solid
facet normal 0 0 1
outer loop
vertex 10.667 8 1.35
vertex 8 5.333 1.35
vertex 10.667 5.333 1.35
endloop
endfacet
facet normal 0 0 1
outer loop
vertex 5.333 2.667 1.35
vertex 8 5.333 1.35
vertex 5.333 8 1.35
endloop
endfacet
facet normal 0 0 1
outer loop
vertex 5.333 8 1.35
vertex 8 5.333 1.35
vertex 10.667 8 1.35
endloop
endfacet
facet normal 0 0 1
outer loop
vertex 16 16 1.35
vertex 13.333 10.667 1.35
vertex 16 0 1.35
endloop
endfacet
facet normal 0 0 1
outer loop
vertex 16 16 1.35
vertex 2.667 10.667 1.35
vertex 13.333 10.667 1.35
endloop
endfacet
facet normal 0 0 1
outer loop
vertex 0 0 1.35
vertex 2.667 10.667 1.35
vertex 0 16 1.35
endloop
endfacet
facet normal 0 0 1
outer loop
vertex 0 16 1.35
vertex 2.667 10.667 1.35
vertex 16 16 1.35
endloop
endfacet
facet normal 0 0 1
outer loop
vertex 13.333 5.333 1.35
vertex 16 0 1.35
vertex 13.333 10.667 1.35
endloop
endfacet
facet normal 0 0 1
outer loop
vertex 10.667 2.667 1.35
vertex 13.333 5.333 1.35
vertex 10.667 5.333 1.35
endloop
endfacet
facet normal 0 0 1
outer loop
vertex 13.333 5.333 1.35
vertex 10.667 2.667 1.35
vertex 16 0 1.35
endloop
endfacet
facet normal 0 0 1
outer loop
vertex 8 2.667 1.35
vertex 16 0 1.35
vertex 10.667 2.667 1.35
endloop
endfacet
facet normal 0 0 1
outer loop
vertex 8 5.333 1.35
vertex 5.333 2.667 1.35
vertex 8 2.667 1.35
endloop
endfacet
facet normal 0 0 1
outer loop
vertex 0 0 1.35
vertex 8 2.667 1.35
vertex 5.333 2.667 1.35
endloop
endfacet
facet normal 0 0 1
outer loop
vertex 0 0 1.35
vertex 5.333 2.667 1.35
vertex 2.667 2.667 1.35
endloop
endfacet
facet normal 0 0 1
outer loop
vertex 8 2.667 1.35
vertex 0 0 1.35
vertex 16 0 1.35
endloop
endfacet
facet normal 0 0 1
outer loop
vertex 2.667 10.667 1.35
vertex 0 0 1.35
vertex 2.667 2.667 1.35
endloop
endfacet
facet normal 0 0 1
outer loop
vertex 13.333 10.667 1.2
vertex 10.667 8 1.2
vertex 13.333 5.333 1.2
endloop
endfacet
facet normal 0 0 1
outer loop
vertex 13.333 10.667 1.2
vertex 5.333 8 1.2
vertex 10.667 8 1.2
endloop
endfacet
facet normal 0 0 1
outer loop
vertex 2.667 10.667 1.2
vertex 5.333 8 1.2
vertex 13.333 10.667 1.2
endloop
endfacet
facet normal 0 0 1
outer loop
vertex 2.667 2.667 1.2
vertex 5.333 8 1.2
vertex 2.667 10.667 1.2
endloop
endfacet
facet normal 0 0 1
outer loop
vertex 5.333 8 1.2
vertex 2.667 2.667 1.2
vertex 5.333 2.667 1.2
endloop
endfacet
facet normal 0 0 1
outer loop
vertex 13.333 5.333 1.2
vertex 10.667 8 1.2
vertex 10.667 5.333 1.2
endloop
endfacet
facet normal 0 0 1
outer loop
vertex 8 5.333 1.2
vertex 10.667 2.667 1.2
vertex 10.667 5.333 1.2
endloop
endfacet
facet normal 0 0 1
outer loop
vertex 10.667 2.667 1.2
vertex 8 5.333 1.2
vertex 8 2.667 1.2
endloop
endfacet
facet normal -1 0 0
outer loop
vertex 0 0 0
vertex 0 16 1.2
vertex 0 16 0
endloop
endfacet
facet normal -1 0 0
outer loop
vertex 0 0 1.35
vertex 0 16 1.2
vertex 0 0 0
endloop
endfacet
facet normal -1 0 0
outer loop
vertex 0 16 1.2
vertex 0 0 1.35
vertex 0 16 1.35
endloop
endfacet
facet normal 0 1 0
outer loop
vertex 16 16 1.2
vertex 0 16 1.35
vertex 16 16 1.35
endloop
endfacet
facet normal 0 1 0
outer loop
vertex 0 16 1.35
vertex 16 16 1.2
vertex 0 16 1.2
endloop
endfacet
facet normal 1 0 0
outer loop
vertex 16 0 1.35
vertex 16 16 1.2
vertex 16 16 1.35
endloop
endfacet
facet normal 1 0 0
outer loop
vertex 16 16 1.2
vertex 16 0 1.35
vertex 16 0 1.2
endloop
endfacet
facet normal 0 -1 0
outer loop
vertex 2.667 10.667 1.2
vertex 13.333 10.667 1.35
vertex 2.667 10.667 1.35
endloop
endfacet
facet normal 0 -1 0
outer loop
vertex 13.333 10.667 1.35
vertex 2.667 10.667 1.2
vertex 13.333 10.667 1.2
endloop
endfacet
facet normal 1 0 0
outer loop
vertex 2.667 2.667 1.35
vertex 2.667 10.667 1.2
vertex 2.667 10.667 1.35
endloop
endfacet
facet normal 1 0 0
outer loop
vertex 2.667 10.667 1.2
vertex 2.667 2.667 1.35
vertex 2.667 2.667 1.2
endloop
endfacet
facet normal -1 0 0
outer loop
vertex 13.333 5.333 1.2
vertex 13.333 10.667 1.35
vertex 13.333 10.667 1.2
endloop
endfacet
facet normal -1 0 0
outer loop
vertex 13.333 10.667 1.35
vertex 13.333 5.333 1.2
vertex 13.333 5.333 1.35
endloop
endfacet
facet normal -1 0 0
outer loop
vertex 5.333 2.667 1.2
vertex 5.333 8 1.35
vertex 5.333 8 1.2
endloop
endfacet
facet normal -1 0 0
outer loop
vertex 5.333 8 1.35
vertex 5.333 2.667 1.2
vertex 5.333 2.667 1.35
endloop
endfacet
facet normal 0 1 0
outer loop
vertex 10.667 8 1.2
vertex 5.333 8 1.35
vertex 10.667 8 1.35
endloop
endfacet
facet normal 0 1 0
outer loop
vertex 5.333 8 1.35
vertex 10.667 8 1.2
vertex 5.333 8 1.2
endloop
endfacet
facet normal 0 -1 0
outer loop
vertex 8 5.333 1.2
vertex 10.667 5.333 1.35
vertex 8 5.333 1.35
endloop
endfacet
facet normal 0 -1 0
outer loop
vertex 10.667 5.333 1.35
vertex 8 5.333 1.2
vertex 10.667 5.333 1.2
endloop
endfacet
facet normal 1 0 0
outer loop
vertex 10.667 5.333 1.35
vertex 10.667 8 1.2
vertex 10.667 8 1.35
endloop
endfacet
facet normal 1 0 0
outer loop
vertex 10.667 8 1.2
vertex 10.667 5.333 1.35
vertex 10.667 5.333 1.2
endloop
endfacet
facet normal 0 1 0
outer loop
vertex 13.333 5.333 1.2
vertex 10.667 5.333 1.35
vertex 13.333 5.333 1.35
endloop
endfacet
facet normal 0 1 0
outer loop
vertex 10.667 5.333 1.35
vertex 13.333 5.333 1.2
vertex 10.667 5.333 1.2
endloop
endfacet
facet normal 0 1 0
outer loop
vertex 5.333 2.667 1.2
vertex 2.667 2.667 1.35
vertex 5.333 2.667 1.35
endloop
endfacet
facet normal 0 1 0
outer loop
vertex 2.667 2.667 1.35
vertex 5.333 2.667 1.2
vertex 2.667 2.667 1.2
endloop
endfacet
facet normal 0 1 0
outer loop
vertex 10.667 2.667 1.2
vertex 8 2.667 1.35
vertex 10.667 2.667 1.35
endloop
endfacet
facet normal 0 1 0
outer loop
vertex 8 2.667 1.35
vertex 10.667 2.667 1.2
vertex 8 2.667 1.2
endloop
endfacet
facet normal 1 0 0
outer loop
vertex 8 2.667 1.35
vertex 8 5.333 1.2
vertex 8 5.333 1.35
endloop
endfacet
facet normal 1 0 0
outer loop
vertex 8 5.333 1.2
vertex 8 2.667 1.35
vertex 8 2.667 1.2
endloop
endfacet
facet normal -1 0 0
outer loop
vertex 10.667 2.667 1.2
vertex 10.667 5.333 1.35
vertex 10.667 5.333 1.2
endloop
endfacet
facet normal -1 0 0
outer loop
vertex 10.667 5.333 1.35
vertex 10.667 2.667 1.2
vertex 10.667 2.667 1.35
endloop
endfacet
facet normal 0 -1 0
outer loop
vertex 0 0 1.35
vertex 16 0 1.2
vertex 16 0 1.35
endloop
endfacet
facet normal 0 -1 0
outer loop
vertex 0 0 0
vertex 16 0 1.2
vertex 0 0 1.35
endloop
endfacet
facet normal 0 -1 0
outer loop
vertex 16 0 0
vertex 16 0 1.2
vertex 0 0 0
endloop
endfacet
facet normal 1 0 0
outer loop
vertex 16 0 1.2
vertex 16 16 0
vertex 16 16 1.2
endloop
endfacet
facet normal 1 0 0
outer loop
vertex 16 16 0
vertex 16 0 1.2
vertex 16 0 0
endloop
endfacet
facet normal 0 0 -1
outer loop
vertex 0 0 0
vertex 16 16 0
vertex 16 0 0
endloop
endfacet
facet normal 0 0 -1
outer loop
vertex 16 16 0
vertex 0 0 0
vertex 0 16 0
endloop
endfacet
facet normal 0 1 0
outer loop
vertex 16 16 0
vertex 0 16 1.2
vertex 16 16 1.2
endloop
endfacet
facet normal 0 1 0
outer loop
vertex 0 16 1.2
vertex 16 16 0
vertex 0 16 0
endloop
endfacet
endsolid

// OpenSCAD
// UMI gripper ArUco marker ID 1, DICT_4X4_50.
// Units: millimeters. The black outer edge is exactly 16 mm.

marker_edge = 16;
base_thickness = 1.20;
pattern_height = 0.15;
cell = marker_edge / 6;

// Top-view raster, row 0 is the top edge of the marker.
marker = [
    [1, 1, 1, 1, 1, 1],
    [1, 1, 1, 1, 1, 1],
    [1, 0, 0, 0, 0, 1],
    [1, 0, 1, 1, 0, 1],
    [1, 0, 1, 0, 1, 1],
    [1, 1, 1, 1, 1, 1]
];

color("white") cube([marker_edge, marker_edge, base_thickness]);

for (row = [0:5]) {
    for (col = [0:5]) {
        if (marker[row][col] == 1) {
            color("black")
                translate([col * cell, (5 - row) * cell, base_thickness])
                    cube([cell, cell, pattern_height]);
        }
    }
}
